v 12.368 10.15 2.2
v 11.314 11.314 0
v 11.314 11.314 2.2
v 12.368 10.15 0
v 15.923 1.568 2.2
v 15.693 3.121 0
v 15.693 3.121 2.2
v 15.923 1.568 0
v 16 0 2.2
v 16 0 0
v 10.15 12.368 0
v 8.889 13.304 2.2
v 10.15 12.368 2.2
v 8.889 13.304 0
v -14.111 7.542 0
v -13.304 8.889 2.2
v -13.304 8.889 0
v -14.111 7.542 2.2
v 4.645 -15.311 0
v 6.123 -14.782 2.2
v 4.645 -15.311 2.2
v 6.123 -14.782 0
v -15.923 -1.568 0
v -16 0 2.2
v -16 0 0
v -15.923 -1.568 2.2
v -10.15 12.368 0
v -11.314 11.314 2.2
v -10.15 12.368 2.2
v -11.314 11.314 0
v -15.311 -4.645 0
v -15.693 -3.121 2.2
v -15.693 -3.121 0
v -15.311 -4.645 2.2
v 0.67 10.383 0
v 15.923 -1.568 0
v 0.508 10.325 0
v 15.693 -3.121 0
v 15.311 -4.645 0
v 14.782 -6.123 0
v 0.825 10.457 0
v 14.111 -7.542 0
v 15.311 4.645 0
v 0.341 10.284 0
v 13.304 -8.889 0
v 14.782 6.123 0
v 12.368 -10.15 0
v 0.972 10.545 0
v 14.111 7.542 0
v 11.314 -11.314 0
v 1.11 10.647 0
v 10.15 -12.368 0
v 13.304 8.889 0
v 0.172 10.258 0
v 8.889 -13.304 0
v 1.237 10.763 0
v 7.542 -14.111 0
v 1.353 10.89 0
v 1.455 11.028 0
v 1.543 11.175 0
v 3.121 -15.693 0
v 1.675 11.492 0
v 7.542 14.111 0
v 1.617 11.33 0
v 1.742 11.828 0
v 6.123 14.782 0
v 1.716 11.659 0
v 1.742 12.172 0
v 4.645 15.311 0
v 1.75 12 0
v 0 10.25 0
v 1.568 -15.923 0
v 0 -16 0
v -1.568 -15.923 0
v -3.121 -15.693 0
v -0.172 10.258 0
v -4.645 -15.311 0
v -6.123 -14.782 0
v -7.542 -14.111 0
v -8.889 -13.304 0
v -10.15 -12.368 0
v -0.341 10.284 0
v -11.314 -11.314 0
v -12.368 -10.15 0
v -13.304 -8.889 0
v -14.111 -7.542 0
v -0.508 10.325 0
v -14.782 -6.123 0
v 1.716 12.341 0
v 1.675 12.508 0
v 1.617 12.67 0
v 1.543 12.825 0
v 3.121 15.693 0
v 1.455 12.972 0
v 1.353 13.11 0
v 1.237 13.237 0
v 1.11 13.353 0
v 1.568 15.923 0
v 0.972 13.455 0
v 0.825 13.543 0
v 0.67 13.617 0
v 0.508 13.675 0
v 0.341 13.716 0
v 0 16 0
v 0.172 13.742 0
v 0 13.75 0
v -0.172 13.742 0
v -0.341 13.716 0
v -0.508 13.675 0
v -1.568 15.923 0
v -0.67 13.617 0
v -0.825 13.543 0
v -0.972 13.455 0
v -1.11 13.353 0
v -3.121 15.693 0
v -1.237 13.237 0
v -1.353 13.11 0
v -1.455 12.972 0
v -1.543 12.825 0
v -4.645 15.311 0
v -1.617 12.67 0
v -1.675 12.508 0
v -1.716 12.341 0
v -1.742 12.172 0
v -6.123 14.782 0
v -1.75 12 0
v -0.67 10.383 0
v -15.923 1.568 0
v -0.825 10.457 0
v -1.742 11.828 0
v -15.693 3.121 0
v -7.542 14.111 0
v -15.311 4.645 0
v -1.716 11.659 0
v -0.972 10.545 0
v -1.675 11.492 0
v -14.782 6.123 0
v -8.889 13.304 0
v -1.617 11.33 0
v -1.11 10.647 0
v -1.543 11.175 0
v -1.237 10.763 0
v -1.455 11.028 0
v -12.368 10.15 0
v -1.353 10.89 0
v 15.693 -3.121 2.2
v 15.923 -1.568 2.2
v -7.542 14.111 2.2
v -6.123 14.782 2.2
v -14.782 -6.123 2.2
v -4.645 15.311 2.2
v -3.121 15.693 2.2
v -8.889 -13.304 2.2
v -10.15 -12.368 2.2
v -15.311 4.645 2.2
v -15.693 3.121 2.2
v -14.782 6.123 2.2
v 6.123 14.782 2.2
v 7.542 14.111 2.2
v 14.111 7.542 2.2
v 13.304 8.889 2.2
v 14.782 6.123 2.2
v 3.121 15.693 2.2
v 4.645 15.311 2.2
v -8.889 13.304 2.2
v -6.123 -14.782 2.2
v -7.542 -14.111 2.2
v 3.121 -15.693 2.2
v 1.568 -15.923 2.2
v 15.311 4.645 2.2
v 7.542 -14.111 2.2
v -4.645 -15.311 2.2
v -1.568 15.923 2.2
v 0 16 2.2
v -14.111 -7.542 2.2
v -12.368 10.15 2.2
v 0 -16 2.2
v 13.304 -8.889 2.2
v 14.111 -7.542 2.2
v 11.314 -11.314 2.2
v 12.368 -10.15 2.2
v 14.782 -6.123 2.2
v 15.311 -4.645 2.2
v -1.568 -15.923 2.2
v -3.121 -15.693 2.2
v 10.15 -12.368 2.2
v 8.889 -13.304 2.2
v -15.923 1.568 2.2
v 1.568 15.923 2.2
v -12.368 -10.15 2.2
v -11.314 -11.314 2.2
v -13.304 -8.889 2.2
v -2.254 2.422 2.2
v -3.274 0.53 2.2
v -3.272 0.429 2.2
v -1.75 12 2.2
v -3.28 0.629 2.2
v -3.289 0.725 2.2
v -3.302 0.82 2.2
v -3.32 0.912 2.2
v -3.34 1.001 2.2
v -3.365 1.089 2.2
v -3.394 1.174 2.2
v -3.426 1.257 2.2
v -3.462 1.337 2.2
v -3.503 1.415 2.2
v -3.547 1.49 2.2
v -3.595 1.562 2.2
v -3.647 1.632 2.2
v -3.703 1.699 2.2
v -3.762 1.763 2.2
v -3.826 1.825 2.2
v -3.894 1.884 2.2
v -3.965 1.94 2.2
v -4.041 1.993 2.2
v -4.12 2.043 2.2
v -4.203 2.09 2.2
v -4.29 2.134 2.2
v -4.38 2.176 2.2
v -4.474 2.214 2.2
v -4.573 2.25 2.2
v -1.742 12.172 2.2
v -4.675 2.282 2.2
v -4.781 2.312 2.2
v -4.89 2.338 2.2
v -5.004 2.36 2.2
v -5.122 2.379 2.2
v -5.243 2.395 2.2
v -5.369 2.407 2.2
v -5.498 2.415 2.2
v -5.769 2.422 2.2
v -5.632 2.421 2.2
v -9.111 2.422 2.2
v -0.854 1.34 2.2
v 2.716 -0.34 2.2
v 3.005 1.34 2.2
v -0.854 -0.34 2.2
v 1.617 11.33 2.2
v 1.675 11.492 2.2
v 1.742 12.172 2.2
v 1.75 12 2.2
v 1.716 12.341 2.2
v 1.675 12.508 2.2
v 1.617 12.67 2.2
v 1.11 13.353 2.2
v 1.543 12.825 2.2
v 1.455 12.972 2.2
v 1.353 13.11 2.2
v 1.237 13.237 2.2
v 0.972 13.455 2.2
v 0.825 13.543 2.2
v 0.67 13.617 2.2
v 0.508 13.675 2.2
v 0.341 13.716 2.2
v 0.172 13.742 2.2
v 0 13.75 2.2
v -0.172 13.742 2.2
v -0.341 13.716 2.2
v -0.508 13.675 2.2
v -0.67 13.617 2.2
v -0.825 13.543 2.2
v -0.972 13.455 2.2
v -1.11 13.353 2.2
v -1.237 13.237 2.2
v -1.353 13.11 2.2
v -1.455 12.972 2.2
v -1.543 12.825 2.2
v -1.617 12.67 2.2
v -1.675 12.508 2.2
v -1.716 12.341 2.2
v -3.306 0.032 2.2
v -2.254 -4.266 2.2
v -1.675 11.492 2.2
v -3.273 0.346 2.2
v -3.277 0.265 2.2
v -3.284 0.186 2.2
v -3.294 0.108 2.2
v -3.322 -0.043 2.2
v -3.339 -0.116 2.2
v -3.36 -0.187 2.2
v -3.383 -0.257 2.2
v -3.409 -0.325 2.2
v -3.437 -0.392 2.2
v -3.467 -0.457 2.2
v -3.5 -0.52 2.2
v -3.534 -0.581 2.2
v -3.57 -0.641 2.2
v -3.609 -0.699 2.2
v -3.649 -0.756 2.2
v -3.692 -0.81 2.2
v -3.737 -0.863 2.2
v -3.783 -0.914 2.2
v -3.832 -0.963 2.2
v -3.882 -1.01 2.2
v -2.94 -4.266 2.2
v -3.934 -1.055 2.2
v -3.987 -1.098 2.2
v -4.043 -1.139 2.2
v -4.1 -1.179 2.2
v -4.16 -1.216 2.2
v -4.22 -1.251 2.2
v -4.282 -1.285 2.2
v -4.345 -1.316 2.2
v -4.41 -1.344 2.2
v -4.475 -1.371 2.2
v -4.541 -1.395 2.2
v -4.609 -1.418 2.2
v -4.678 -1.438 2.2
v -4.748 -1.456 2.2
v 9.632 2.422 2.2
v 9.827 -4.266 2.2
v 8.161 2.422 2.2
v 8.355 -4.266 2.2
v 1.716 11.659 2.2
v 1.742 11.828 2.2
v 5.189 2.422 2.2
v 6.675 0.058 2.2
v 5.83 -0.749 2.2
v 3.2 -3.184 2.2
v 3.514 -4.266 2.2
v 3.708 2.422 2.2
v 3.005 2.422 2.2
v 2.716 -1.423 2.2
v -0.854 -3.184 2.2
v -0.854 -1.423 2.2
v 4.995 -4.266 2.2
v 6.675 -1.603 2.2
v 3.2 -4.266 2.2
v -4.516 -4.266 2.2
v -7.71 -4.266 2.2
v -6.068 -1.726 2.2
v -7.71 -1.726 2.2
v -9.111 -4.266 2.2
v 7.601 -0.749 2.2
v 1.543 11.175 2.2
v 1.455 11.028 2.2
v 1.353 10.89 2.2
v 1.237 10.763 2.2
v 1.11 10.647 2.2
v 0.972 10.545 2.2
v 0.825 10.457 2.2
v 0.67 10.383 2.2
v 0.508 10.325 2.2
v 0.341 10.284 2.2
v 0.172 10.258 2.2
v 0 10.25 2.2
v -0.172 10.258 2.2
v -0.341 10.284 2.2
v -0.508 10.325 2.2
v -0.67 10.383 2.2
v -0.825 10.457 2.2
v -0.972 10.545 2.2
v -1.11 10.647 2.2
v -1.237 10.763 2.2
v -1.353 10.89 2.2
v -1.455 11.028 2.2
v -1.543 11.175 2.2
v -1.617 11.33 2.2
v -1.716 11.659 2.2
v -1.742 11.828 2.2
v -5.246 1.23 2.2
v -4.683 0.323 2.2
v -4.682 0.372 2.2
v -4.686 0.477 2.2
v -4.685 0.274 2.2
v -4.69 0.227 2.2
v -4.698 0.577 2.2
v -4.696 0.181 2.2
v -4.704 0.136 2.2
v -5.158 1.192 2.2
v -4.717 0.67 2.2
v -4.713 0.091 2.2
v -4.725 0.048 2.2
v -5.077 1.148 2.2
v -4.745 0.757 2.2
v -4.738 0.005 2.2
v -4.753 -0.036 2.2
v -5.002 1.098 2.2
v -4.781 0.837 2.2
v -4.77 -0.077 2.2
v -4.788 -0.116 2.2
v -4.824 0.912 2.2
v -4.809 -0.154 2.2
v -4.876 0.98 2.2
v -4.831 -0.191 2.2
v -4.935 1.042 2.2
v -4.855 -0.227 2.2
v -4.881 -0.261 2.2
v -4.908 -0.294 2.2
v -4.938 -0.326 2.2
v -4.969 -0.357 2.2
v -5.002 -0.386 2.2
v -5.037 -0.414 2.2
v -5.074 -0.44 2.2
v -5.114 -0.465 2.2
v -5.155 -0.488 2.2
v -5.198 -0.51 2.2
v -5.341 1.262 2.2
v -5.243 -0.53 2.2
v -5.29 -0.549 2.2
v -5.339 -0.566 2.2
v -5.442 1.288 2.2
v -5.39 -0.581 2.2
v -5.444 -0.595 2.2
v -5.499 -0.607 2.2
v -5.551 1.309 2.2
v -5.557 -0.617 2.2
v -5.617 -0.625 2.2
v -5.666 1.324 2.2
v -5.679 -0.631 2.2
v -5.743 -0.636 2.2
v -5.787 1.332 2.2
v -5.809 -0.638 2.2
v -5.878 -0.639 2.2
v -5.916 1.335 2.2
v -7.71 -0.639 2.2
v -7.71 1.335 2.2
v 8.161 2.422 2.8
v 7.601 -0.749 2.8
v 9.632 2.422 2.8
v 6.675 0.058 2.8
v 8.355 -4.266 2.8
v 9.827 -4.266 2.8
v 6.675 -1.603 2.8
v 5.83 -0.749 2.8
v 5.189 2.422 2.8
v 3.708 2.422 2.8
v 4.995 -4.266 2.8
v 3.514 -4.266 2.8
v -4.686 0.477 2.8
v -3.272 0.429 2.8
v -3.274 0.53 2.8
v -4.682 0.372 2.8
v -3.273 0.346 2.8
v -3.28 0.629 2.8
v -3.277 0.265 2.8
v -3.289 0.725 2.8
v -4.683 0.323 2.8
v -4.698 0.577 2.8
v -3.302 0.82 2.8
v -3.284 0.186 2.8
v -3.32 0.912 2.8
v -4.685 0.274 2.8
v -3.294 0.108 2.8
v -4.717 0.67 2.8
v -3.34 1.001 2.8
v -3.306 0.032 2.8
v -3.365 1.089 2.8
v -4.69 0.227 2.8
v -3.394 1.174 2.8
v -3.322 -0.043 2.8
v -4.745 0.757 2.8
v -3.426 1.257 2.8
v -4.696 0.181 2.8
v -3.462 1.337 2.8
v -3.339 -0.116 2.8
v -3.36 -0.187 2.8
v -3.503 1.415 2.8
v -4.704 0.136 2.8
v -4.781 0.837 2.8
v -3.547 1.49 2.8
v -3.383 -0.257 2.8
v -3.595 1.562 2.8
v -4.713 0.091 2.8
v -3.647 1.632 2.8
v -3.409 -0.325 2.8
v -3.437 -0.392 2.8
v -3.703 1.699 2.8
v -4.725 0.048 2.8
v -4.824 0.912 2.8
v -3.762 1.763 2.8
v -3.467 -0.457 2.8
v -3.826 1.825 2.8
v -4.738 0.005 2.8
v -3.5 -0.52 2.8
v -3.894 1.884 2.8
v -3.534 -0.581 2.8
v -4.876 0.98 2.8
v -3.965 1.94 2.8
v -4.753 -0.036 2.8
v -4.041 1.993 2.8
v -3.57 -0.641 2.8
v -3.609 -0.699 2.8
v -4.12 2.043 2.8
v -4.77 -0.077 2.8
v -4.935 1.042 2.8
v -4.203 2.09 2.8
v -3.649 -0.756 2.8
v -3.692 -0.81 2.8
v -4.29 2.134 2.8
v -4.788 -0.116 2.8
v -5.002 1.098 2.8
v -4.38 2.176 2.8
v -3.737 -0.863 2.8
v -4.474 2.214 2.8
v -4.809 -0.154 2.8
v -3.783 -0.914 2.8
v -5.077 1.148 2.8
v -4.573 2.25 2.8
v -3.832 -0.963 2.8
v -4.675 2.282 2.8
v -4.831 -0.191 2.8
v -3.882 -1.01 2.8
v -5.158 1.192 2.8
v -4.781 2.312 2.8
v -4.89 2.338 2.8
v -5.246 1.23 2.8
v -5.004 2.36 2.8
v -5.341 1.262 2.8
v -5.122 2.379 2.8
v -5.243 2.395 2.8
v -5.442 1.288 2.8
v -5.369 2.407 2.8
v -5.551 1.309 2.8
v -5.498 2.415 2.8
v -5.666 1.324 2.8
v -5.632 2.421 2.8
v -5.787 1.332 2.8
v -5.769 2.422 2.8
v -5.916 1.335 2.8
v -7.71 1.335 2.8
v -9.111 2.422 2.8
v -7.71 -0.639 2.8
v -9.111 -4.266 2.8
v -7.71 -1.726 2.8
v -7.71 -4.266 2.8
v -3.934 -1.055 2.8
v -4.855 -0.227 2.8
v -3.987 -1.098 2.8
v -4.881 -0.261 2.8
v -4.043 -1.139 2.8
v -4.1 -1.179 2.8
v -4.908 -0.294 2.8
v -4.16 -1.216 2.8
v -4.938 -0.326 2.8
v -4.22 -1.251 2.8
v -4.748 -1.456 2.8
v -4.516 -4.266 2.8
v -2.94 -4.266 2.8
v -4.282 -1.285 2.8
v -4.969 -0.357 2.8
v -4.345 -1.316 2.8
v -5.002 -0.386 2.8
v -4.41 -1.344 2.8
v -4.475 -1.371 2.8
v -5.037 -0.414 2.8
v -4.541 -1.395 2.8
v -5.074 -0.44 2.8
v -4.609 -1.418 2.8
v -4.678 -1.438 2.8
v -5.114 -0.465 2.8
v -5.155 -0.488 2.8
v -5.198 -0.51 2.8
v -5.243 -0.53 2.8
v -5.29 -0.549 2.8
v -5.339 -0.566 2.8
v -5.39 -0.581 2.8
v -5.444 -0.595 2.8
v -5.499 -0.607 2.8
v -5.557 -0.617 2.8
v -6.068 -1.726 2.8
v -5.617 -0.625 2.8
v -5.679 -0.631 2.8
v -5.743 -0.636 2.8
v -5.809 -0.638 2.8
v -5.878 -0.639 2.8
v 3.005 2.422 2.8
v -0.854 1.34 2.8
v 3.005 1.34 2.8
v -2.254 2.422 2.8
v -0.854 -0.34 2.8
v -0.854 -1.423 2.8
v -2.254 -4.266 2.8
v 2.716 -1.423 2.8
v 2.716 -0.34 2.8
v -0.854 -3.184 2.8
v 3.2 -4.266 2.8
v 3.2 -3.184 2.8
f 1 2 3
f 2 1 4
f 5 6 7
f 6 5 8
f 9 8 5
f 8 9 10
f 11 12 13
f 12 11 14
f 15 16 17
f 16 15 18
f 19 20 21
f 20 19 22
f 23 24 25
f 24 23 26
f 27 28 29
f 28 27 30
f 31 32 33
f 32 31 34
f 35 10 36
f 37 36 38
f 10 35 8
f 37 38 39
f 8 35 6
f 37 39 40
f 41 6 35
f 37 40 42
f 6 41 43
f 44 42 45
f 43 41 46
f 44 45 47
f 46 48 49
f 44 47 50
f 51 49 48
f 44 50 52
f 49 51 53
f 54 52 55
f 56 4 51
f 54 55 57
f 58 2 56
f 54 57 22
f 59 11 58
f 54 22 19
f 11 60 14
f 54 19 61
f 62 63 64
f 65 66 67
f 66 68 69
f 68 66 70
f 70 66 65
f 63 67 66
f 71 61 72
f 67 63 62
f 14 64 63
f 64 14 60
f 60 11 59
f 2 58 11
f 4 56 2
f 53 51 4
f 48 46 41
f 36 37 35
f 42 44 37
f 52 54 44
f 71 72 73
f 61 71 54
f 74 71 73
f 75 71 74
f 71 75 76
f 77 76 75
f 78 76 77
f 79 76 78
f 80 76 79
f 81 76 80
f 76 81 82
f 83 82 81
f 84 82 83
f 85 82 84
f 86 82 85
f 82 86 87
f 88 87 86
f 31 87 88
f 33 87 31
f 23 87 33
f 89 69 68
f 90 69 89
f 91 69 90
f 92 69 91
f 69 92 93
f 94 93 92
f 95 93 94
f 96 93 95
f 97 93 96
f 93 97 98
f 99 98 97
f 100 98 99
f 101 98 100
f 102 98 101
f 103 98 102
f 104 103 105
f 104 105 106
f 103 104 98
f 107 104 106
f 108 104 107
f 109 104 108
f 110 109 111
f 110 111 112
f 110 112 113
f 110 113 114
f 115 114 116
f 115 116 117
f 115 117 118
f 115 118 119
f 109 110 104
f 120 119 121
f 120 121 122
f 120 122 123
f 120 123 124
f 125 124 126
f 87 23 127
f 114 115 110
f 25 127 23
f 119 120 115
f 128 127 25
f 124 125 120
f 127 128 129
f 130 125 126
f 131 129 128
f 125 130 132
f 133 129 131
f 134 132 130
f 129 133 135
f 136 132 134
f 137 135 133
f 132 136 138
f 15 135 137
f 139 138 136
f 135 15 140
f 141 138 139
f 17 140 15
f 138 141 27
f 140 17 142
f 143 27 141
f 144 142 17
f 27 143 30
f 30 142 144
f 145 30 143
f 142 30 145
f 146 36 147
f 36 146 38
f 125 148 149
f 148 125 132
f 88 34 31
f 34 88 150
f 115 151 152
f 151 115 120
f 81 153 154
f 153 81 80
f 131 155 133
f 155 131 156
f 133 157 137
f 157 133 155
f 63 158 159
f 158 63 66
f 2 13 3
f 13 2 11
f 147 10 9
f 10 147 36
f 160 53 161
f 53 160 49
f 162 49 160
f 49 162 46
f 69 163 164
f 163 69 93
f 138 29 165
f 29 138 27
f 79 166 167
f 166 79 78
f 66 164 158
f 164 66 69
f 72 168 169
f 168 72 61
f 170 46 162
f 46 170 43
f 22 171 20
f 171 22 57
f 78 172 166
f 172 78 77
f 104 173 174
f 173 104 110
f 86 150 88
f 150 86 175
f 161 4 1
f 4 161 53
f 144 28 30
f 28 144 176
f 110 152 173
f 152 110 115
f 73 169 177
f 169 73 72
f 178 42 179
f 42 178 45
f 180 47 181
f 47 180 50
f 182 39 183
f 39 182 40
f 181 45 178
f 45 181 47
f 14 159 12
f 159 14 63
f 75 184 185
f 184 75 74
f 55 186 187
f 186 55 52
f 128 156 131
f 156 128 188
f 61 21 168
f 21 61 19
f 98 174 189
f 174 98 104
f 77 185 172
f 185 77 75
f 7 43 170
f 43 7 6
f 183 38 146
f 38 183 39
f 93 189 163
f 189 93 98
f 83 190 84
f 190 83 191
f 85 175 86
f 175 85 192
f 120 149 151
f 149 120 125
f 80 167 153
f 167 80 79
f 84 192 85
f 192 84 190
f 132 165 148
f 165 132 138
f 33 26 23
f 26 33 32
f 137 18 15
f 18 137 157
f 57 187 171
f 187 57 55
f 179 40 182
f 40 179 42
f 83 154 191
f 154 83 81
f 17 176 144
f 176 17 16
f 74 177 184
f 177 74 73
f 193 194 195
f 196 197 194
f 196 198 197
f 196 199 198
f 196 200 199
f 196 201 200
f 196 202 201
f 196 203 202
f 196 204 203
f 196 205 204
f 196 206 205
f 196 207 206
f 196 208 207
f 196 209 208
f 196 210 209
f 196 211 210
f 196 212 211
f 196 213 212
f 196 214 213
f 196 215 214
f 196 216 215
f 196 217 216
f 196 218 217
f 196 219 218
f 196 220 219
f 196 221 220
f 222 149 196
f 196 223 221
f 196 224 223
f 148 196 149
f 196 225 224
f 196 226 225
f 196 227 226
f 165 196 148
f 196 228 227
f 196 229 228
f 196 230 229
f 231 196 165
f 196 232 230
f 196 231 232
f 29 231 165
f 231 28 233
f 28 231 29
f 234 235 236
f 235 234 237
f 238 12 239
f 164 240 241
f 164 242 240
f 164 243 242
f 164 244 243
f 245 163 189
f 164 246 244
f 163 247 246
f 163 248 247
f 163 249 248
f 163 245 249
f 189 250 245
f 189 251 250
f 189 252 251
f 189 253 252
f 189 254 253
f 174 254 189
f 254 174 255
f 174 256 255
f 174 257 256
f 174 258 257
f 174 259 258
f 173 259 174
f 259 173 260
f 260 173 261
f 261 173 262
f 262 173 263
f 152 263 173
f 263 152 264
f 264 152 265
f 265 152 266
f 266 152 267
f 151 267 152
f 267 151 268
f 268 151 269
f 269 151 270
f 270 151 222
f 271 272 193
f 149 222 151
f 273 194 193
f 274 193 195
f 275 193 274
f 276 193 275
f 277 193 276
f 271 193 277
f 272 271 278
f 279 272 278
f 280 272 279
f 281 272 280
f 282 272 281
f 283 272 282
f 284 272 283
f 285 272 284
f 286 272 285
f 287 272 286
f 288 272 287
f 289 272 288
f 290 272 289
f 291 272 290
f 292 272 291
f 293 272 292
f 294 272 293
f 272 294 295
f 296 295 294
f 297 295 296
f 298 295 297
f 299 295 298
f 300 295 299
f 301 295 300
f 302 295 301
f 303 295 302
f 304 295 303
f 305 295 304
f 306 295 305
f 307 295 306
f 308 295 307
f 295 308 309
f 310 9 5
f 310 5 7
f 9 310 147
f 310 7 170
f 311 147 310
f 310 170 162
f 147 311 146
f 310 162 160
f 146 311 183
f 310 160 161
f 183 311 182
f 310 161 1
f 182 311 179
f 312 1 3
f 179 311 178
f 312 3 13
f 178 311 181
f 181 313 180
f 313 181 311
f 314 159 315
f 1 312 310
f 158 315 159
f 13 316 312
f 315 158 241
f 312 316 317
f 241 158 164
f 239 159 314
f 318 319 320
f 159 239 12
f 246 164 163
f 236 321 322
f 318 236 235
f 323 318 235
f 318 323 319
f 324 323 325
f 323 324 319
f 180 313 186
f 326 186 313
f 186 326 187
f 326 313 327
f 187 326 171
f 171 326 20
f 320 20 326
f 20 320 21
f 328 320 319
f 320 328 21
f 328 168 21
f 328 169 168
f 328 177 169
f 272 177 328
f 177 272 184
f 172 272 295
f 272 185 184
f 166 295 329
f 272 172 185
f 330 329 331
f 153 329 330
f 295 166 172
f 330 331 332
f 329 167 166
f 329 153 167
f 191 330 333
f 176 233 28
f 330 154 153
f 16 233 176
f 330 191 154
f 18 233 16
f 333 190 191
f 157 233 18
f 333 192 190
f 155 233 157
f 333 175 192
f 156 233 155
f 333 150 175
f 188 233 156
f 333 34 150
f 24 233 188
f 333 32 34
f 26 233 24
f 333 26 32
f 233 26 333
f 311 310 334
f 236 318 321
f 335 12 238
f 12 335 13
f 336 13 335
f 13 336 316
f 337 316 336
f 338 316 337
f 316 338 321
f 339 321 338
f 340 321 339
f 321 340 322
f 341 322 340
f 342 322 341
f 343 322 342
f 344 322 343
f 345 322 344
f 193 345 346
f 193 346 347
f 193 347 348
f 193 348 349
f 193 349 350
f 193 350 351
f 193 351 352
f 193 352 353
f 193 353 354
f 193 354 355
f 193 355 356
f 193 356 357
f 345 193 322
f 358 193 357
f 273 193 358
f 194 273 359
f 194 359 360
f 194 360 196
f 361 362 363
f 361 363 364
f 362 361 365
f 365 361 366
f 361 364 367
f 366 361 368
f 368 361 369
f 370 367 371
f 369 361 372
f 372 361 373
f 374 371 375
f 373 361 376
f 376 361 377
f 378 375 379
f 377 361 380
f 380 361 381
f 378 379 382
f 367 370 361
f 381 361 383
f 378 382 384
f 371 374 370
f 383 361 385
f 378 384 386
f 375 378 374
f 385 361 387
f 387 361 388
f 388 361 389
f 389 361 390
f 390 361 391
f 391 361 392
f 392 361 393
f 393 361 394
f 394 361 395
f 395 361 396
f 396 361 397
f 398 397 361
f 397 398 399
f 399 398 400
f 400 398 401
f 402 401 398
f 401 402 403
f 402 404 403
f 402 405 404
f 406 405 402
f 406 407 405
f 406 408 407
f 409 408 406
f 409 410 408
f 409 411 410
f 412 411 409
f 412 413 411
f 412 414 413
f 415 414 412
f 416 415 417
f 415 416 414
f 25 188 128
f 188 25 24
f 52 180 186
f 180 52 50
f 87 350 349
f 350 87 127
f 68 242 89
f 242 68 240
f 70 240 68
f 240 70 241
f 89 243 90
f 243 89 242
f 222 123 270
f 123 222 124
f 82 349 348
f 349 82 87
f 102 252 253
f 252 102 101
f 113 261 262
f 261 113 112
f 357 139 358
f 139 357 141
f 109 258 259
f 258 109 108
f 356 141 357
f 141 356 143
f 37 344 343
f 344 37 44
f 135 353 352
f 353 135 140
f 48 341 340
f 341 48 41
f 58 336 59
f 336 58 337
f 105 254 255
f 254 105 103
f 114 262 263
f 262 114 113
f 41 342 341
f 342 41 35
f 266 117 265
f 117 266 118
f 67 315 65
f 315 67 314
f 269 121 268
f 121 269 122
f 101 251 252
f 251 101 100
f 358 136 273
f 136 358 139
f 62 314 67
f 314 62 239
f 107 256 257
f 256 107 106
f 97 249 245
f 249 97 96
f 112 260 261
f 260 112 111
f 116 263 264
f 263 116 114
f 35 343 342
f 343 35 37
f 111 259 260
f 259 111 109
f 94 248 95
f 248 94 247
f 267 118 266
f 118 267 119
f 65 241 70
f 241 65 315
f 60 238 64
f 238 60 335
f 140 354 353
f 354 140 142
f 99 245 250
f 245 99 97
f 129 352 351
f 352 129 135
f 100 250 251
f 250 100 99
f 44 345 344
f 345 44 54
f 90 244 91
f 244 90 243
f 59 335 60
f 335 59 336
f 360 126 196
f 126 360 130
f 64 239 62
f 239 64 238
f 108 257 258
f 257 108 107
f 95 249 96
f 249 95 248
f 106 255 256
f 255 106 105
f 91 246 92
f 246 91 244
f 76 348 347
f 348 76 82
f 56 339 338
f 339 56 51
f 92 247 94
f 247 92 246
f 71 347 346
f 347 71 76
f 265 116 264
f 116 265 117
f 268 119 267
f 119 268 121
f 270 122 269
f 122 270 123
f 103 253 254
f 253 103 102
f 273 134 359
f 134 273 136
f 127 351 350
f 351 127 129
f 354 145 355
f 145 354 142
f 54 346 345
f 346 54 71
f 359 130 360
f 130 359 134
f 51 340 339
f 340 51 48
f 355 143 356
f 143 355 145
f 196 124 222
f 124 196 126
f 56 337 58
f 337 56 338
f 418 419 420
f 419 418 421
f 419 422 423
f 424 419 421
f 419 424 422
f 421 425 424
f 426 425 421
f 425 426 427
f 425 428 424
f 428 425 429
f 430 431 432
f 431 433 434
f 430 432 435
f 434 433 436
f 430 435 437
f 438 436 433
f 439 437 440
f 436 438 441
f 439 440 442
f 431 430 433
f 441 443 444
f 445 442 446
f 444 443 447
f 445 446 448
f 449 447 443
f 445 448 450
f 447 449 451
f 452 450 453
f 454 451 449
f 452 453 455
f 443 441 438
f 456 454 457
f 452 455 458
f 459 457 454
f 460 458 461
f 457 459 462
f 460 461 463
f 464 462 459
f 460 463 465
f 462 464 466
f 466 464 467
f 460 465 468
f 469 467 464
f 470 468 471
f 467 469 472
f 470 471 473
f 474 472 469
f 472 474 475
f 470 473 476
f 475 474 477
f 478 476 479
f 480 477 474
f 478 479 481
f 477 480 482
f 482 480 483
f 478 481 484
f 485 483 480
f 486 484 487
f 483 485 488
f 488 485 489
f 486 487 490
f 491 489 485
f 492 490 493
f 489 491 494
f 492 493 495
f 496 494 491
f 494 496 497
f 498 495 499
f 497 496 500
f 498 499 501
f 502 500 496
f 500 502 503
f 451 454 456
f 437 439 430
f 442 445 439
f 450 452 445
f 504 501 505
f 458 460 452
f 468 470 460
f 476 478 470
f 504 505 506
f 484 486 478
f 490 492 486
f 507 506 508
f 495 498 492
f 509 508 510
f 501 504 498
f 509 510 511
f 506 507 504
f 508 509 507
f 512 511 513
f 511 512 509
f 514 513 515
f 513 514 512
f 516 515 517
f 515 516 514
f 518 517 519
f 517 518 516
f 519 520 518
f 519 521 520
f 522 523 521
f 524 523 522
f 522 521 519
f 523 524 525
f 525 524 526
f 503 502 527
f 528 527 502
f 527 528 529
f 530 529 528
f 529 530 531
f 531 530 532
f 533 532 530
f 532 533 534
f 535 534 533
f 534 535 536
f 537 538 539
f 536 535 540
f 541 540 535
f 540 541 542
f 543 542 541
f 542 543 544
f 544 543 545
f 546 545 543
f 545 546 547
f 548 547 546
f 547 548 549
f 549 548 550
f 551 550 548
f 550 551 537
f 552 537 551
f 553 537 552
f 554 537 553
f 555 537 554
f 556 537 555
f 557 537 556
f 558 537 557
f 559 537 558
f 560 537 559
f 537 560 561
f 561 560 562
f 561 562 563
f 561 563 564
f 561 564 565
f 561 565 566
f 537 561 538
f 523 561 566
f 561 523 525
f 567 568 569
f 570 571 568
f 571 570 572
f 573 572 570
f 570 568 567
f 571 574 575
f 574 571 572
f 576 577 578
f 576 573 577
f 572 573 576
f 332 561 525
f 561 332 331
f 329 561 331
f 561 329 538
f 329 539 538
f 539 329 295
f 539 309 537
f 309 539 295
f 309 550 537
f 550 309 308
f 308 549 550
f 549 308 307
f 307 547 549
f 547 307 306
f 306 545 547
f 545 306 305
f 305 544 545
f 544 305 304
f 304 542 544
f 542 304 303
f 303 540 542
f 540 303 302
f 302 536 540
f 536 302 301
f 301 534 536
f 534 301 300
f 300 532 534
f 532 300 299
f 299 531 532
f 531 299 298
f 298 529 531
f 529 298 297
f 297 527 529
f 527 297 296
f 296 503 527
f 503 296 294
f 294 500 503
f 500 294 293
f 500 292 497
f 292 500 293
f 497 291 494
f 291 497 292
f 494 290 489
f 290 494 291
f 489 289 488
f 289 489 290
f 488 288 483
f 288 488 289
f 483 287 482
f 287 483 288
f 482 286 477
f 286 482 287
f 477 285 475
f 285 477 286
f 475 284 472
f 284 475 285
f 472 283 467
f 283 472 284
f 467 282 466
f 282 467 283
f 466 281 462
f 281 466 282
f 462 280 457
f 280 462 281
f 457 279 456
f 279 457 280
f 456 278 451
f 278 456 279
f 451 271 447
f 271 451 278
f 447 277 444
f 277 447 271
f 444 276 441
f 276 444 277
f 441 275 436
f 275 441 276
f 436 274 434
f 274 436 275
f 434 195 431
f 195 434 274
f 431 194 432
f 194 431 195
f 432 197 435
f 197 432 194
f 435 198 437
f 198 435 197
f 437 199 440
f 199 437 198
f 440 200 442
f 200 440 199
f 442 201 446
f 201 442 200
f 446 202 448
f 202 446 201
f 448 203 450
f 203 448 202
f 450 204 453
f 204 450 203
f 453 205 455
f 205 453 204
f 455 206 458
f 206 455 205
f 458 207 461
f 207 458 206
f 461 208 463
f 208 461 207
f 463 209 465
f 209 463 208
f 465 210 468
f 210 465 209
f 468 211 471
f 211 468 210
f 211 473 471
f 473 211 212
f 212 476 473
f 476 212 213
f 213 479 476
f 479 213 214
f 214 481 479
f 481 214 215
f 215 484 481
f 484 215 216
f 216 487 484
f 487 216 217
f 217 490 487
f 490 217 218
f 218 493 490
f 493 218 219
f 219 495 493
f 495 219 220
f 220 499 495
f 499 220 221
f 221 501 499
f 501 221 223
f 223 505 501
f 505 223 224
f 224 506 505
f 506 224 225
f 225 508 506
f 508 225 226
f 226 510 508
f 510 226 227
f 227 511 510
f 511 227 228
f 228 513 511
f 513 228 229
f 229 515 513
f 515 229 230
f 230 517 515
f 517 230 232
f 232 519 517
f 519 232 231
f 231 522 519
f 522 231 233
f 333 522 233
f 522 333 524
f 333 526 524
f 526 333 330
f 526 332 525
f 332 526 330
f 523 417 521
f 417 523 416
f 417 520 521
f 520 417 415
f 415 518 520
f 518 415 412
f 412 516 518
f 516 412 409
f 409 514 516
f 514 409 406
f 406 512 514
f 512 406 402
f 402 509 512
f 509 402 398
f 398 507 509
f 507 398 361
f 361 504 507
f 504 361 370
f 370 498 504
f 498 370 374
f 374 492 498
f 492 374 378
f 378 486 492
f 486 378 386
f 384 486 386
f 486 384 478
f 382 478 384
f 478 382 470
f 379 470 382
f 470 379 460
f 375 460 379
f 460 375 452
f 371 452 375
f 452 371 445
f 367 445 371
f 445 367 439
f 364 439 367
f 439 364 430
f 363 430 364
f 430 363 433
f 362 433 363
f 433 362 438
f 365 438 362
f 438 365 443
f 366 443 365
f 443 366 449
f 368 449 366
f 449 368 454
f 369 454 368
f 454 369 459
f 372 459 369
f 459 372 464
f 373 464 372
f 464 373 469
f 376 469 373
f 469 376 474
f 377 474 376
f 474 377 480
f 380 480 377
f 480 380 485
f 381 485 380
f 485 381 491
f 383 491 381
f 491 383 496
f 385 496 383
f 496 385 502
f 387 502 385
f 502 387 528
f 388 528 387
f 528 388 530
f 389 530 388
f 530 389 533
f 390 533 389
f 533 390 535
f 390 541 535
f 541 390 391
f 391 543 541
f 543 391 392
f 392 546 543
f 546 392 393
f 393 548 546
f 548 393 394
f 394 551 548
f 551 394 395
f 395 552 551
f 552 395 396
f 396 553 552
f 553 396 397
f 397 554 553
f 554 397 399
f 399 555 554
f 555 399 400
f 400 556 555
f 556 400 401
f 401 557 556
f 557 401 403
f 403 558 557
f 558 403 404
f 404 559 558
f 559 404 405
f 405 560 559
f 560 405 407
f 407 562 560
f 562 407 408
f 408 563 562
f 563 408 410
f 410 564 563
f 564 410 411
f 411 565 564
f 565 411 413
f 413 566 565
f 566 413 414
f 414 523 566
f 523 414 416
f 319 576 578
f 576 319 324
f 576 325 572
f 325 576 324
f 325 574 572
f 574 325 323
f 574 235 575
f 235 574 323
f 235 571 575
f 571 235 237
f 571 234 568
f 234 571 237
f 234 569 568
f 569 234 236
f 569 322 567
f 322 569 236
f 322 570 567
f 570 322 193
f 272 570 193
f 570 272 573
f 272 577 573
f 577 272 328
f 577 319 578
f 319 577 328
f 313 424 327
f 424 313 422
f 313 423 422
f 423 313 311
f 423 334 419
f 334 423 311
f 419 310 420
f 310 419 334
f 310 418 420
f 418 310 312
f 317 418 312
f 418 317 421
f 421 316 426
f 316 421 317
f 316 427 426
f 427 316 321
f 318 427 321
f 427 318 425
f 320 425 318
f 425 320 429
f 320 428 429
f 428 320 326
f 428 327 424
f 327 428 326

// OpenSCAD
// file: lib/plate.scad
// ---------------------------------------------------------------------------
// plate.scad — shared geometry for the two-tone product line.
// Every part in this folder is a rounded plate plus raised text, so the whole
// catalogue is one filament change away from looking multi-colour.
// ---------------------------------------------------------------------------

$fn = 64;

// Glyph advances for Liberation Sans Bold, in multiples of the text size.
// Measured by rendering "HxH" against "HH" at size 100, because OpenSCAD 2021
// cannot measure a string at runtime. Swap the font and these go stale — the
// plate grows or the text hangs off the edge, so re-measure if you change it.
ADV_CHARS = "ABCDEFGHIJKLMNOPQRSTUVWXYZabcdefghijklmnopqrstuvwxyz0123456789 -.,'&/#+";
ADV_VALS = [
    0.979, 0.979, 0.979, 0.979, 0.905, 0.828, 1.055, 0.979, 0.377, 0.754,
    0.979, 0.828, 1.130, 0.979, 1.055, 0.905, 1.055, 0.979, 0.905, 0.828,
    0.979, 0.905, 1.280, 0.905, 0.905, 0.828,
    0.754, 0.828, 0.754, 0.828, 0.754, 0.452, 0.828, 0.828, 0.377, 0.377,
    0.754, 0.377, 1.206, 0.828, 0.828, 0.828, 0.828, 0.528, 0.754, 0.452,
    0.828, 0.754, 1.055, 0.754, 0.754, 0.678,
    0.754, 0.754, 0.754, 0.754, 0.754, 0.754, 0.754, 0.754, 0.754, 0.754,
    0.377, 0.452, 0.377, 0.377, 0.323, 0.979, 0.377, 0.754, 0.792
];

// Unknown glyphs fall back to the widest measured advance, so an accent or a
// symbol makes the plate too big rather than too small.
function char_adv(c) = let (i = search(c, ADV_CHARS)) (i == [] ? 1.28 : ADV_VALS[i[0]]);

function text_width(txt, size, i = 0) =
    i >= len(txt) ? 0 : char_adv(txt[i]) * size + text_width(txt, size, i + 1);

function plate_width(txt, size, pad, min_w) =
    max(min_w, text_width(txt, size) + 2 * pad);

// Largest text size that fits a fixed-width space — used by the round parts,
// whose plate cannot simply grow to fit a long name.
function fit_size(txt, max_size, avail_w) =
    min(max_size, avail_w / max(text_width(txt, 1), 0.001));

// Layer the slicer must pause before, 1-indexed, for a given base height.
function pause_layer(base_h, layer_h) = floor(base_h / layer_h + 0.5) + 1;

module rounded_plate(w, d, r, h) {
    linear_extrude(height = h)
        offset(r = r)
            square([max(w - 2 * r, 0.01), max(d - 2 * r, 0.01)], center = true);
}

module raised_text(txt, size, h, z, font, spacing = 1.0) {
    translate([0, 0, z])
        linear_extrude(height = h)
            text(txt, size = size, font = font, spacing = spacing,
                 halign = "center", valign = "center");
}

module hang_hole(x, y, z, dia, h) {
    translate([x, y, z - 1])
        cylinder(h = h + 2, d = dia);
}

module report(label, w, d, base_h, text_h, layer_h) {
    echo(str(label, ": ", w, " x ", d, " x ", base_h + text_h,
             " mm  |  swap filament before layer ", pause_layer(base_h, layer_h),
             " (Z = ", base_h, " mm)"));
}

// The name sign lives here so that name_sign.scad and batch.scad build the
// identical part from one definition.
module name_sign(name, text_size = 14, base_h = 3.0, text_h = 0.8, pad = 9,
                 corner_r = 3, min_width = 60,
                 font = "Liberation Sans:style=Bold", part = "all") {
    w = plate_width(name, text_size, pad, min_width);
    d = text_size + 2 * pad;
    if (part == "all" || part == "base") rounded_plate(w, d, corner_r, base_h);
    if (part == "all" || part == "text") raised_text(name, text_size, text_h, base_h, font);
}
// main file
// ---------------------------------------------------------------------------
// pet_tag.scad — pet tag or plant marker, sold ten to a batch.
//
//   openscad -o rex.stl -D 'name="REX"' -D 'line2="+358 40 123 4567"' pet_tag.scad
//
// Batch of 10 sells for ~€12 at ~22 g and ~1.1 h.
// Print in PETG if it lives outdoors — PLA goes brittle in UV.
// ---------------------------------------------------------------------------
include <lib/plate.scad>

name        = "REX";
line2       = "";                 // optional second line: a phone number, a species
font        = "Liberation Sans:style=Bold";
text_size   = 7;
line2_size  = 4;
base_h      = 2.2;
text_h      = 0.6;
dia         = 32;
hole_d      = 3.5;
hole_inset  = 4;                  // from the rim to the hole centre
layer_h     = 0.2;
part        = "all";

module body() {
    difference() {
        cylinder(h = base_h, d = dia);
        hang_hole(0, dia / 2 - hole_inset, 0, hole_d, base_h);
    }
}

y_main  = (line2 == "") ? -1 : 2.5;
y_line2 = -5.5;

// A disc narrows away from its centre, so fit each line to its own chord.
function chord(y) = 2 * sqrt(max(pow(dia / 2, 2) - pow(abs(y) + 4, 2), 1)) - 3;
main_size  = fit_size(name,  text_size,  chord(y_main));
line2_fit  = fit_size(line2, line2_size, chord(y_line2));

if (part == "all" || part == "base") body();
if (part == "all" || part == "text") {
    translate([0, y_main, 0]) raised_text(name, main_size, text_h, base_h, font);
    if (line2 != "")
        translate([0, y_line2, 0]) raised_text(line2, line2_fit, text_h, base_h, font);
}

report("Pet tag", dia, dia, base_h, text_h, layer_h);
